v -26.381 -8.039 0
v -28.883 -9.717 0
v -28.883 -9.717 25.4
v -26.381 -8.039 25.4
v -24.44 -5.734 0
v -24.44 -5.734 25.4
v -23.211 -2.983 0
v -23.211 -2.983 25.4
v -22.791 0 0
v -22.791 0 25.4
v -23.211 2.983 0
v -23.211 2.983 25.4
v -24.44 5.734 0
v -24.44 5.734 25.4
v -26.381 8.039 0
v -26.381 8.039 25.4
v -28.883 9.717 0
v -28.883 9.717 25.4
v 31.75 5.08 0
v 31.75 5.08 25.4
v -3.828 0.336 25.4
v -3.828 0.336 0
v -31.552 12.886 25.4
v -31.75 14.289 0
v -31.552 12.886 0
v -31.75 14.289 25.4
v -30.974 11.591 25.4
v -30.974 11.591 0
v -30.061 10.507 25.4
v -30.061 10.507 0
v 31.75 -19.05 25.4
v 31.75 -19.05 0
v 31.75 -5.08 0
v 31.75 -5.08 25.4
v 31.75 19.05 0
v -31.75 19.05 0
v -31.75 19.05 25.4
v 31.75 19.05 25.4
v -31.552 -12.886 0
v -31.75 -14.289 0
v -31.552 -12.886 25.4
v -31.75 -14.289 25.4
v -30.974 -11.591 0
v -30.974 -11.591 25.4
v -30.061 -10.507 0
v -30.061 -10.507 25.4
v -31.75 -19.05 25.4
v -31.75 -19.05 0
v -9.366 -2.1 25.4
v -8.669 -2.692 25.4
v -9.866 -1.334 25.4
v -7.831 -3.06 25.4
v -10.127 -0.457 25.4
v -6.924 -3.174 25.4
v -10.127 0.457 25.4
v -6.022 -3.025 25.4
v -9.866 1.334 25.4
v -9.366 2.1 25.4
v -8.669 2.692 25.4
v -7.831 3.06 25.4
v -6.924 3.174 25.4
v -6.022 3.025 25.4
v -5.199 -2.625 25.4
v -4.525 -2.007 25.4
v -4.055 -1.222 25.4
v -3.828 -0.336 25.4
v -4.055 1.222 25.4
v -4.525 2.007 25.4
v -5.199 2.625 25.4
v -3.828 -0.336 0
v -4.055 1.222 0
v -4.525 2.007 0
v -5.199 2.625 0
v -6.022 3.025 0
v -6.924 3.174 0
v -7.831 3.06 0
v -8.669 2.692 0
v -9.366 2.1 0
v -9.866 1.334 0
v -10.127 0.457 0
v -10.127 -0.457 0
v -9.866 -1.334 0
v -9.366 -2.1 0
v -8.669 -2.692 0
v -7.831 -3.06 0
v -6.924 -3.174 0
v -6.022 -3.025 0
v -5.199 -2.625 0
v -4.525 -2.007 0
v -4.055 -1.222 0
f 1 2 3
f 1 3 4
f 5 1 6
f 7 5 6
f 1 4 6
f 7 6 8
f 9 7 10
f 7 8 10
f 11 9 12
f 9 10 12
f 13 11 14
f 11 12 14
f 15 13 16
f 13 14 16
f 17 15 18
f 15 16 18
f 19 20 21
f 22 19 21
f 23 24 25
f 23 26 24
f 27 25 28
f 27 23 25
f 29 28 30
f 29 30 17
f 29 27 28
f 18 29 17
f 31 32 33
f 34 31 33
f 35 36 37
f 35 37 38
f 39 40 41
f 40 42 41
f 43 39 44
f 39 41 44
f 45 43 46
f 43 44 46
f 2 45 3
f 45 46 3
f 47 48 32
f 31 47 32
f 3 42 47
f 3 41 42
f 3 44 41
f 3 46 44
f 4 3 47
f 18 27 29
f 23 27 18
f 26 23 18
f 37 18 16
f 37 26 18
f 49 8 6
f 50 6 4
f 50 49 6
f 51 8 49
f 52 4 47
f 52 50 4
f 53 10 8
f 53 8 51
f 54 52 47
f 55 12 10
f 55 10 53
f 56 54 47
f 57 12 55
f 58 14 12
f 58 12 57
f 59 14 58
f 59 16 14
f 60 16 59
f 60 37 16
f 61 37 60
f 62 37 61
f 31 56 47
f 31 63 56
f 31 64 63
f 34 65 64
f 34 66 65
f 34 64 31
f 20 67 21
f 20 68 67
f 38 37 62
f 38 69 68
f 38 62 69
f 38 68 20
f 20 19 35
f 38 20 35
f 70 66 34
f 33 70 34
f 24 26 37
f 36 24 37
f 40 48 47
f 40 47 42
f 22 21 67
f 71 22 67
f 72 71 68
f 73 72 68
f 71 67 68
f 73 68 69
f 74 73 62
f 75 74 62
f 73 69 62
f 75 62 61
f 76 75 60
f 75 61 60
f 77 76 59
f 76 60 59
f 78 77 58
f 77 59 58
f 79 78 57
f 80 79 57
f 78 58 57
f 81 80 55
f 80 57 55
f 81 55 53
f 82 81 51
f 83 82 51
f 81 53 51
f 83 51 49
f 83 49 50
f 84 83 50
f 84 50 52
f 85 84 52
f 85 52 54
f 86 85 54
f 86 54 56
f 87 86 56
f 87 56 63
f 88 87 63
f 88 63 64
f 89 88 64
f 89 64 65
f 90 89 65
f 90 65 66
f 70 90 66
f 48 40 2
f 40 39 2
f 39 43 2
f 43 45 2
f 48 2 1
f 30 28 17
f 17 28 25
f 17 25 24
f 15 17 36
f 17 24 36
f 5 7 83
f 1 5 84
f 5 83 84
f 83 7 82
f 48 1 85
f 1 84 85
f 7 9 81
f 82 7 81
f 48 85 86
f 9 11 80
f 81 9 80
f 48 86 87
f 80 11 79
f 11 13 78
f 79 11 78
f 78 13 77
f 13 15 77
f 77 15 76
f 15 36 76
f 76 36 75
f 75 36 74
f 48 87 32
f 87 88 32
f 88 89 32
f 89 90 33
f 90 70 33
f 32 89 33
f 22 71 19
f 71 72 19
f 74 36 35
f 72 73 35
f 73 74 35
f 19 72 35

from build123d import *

# Parameters (mm, degrees)
F0_W     = 63.5
F0_H     = 38.1
F1_DEPTH = 25.4
F4_DEPTH = 38.1
F5_R     = 10.795
F6_DEPTH = 38.1
F7_R     = 5.08


with BuildPart() as f1:
    # F0 (on Top) → F1 (new body)
    with BuildSketch(Plane.XY):
        Rectangle(F0_W, F0_H)
    extrude(amount=F1_DEPTH)

    # F3 (on face) → F4 (cut)
    with BuildSketch(Plane.XY.offset(25.4)):
        with BuildLine():
            Line((-3.8278593449, -0.3362854207), (-6.35, 0))
            Line((-6.35, 0), (-3.8278593449, 0.3362854207))
            ThreePointArc((-3.8278593449, 0.3362854207), (-10.16, 0), (-3.8278593449, -0.3362854207))
        make_face()
        with BuildLine():
            Line((-3.8278593449, 0.3362854207), (-6.35, 0))
            Line((-6.35, 0), (-3.8278593449, -0.3362854207))
            ThreePointArc((-3.8278593449, -0.3362854207), (-3.81446798, -0.1683796606), (-3.81, 0))
            ThreePointArc((-3.81, 0), (-3.81446798, 0.1683796606), (-3.8278593449, 0.3362854207))
        make_face()
        with BuildLine():
            Line((31.75, 5.08), (-3.8278593449, 0.3362854207))
            ThreePointArc((-3.8278593449, 0.3362854207), (-3.81446798, 0.1683796606), (-3.81, 0))
            ThreePointArc((-3.81, 0), (-3.81446798, -0.1683796606), (-3.8278593449, -0.3362854207))
            Line((-3.8278593449, -0.3362854207), (31.75, -5.08))
            Line((31.75, -5.08), (31.75, 5.08))
        make_face()
    extrude(amount=-F4_DEPTH, mode=Mode.SUBTRACT)

    # F5 (on face) → F6 (cut)
    with BuildSketch(Plane.XY.offset(25.4)):
        with Locations((-33.5856959183, 0)):
            Circle(F5_R)
    extrude(amount=-F6_DEPTH, mode=Mode.SUBTRACT)

    # F7
    f7_edges = [f1.edges().sort_by_distance(p)[0] for p in [
        (-31.75, 10.637774, 12.7),
        (-31.75, -10.637774, 12.7),
    ]]
    fillet(f7_edges, radius=F7_R)


solid = f1.part
